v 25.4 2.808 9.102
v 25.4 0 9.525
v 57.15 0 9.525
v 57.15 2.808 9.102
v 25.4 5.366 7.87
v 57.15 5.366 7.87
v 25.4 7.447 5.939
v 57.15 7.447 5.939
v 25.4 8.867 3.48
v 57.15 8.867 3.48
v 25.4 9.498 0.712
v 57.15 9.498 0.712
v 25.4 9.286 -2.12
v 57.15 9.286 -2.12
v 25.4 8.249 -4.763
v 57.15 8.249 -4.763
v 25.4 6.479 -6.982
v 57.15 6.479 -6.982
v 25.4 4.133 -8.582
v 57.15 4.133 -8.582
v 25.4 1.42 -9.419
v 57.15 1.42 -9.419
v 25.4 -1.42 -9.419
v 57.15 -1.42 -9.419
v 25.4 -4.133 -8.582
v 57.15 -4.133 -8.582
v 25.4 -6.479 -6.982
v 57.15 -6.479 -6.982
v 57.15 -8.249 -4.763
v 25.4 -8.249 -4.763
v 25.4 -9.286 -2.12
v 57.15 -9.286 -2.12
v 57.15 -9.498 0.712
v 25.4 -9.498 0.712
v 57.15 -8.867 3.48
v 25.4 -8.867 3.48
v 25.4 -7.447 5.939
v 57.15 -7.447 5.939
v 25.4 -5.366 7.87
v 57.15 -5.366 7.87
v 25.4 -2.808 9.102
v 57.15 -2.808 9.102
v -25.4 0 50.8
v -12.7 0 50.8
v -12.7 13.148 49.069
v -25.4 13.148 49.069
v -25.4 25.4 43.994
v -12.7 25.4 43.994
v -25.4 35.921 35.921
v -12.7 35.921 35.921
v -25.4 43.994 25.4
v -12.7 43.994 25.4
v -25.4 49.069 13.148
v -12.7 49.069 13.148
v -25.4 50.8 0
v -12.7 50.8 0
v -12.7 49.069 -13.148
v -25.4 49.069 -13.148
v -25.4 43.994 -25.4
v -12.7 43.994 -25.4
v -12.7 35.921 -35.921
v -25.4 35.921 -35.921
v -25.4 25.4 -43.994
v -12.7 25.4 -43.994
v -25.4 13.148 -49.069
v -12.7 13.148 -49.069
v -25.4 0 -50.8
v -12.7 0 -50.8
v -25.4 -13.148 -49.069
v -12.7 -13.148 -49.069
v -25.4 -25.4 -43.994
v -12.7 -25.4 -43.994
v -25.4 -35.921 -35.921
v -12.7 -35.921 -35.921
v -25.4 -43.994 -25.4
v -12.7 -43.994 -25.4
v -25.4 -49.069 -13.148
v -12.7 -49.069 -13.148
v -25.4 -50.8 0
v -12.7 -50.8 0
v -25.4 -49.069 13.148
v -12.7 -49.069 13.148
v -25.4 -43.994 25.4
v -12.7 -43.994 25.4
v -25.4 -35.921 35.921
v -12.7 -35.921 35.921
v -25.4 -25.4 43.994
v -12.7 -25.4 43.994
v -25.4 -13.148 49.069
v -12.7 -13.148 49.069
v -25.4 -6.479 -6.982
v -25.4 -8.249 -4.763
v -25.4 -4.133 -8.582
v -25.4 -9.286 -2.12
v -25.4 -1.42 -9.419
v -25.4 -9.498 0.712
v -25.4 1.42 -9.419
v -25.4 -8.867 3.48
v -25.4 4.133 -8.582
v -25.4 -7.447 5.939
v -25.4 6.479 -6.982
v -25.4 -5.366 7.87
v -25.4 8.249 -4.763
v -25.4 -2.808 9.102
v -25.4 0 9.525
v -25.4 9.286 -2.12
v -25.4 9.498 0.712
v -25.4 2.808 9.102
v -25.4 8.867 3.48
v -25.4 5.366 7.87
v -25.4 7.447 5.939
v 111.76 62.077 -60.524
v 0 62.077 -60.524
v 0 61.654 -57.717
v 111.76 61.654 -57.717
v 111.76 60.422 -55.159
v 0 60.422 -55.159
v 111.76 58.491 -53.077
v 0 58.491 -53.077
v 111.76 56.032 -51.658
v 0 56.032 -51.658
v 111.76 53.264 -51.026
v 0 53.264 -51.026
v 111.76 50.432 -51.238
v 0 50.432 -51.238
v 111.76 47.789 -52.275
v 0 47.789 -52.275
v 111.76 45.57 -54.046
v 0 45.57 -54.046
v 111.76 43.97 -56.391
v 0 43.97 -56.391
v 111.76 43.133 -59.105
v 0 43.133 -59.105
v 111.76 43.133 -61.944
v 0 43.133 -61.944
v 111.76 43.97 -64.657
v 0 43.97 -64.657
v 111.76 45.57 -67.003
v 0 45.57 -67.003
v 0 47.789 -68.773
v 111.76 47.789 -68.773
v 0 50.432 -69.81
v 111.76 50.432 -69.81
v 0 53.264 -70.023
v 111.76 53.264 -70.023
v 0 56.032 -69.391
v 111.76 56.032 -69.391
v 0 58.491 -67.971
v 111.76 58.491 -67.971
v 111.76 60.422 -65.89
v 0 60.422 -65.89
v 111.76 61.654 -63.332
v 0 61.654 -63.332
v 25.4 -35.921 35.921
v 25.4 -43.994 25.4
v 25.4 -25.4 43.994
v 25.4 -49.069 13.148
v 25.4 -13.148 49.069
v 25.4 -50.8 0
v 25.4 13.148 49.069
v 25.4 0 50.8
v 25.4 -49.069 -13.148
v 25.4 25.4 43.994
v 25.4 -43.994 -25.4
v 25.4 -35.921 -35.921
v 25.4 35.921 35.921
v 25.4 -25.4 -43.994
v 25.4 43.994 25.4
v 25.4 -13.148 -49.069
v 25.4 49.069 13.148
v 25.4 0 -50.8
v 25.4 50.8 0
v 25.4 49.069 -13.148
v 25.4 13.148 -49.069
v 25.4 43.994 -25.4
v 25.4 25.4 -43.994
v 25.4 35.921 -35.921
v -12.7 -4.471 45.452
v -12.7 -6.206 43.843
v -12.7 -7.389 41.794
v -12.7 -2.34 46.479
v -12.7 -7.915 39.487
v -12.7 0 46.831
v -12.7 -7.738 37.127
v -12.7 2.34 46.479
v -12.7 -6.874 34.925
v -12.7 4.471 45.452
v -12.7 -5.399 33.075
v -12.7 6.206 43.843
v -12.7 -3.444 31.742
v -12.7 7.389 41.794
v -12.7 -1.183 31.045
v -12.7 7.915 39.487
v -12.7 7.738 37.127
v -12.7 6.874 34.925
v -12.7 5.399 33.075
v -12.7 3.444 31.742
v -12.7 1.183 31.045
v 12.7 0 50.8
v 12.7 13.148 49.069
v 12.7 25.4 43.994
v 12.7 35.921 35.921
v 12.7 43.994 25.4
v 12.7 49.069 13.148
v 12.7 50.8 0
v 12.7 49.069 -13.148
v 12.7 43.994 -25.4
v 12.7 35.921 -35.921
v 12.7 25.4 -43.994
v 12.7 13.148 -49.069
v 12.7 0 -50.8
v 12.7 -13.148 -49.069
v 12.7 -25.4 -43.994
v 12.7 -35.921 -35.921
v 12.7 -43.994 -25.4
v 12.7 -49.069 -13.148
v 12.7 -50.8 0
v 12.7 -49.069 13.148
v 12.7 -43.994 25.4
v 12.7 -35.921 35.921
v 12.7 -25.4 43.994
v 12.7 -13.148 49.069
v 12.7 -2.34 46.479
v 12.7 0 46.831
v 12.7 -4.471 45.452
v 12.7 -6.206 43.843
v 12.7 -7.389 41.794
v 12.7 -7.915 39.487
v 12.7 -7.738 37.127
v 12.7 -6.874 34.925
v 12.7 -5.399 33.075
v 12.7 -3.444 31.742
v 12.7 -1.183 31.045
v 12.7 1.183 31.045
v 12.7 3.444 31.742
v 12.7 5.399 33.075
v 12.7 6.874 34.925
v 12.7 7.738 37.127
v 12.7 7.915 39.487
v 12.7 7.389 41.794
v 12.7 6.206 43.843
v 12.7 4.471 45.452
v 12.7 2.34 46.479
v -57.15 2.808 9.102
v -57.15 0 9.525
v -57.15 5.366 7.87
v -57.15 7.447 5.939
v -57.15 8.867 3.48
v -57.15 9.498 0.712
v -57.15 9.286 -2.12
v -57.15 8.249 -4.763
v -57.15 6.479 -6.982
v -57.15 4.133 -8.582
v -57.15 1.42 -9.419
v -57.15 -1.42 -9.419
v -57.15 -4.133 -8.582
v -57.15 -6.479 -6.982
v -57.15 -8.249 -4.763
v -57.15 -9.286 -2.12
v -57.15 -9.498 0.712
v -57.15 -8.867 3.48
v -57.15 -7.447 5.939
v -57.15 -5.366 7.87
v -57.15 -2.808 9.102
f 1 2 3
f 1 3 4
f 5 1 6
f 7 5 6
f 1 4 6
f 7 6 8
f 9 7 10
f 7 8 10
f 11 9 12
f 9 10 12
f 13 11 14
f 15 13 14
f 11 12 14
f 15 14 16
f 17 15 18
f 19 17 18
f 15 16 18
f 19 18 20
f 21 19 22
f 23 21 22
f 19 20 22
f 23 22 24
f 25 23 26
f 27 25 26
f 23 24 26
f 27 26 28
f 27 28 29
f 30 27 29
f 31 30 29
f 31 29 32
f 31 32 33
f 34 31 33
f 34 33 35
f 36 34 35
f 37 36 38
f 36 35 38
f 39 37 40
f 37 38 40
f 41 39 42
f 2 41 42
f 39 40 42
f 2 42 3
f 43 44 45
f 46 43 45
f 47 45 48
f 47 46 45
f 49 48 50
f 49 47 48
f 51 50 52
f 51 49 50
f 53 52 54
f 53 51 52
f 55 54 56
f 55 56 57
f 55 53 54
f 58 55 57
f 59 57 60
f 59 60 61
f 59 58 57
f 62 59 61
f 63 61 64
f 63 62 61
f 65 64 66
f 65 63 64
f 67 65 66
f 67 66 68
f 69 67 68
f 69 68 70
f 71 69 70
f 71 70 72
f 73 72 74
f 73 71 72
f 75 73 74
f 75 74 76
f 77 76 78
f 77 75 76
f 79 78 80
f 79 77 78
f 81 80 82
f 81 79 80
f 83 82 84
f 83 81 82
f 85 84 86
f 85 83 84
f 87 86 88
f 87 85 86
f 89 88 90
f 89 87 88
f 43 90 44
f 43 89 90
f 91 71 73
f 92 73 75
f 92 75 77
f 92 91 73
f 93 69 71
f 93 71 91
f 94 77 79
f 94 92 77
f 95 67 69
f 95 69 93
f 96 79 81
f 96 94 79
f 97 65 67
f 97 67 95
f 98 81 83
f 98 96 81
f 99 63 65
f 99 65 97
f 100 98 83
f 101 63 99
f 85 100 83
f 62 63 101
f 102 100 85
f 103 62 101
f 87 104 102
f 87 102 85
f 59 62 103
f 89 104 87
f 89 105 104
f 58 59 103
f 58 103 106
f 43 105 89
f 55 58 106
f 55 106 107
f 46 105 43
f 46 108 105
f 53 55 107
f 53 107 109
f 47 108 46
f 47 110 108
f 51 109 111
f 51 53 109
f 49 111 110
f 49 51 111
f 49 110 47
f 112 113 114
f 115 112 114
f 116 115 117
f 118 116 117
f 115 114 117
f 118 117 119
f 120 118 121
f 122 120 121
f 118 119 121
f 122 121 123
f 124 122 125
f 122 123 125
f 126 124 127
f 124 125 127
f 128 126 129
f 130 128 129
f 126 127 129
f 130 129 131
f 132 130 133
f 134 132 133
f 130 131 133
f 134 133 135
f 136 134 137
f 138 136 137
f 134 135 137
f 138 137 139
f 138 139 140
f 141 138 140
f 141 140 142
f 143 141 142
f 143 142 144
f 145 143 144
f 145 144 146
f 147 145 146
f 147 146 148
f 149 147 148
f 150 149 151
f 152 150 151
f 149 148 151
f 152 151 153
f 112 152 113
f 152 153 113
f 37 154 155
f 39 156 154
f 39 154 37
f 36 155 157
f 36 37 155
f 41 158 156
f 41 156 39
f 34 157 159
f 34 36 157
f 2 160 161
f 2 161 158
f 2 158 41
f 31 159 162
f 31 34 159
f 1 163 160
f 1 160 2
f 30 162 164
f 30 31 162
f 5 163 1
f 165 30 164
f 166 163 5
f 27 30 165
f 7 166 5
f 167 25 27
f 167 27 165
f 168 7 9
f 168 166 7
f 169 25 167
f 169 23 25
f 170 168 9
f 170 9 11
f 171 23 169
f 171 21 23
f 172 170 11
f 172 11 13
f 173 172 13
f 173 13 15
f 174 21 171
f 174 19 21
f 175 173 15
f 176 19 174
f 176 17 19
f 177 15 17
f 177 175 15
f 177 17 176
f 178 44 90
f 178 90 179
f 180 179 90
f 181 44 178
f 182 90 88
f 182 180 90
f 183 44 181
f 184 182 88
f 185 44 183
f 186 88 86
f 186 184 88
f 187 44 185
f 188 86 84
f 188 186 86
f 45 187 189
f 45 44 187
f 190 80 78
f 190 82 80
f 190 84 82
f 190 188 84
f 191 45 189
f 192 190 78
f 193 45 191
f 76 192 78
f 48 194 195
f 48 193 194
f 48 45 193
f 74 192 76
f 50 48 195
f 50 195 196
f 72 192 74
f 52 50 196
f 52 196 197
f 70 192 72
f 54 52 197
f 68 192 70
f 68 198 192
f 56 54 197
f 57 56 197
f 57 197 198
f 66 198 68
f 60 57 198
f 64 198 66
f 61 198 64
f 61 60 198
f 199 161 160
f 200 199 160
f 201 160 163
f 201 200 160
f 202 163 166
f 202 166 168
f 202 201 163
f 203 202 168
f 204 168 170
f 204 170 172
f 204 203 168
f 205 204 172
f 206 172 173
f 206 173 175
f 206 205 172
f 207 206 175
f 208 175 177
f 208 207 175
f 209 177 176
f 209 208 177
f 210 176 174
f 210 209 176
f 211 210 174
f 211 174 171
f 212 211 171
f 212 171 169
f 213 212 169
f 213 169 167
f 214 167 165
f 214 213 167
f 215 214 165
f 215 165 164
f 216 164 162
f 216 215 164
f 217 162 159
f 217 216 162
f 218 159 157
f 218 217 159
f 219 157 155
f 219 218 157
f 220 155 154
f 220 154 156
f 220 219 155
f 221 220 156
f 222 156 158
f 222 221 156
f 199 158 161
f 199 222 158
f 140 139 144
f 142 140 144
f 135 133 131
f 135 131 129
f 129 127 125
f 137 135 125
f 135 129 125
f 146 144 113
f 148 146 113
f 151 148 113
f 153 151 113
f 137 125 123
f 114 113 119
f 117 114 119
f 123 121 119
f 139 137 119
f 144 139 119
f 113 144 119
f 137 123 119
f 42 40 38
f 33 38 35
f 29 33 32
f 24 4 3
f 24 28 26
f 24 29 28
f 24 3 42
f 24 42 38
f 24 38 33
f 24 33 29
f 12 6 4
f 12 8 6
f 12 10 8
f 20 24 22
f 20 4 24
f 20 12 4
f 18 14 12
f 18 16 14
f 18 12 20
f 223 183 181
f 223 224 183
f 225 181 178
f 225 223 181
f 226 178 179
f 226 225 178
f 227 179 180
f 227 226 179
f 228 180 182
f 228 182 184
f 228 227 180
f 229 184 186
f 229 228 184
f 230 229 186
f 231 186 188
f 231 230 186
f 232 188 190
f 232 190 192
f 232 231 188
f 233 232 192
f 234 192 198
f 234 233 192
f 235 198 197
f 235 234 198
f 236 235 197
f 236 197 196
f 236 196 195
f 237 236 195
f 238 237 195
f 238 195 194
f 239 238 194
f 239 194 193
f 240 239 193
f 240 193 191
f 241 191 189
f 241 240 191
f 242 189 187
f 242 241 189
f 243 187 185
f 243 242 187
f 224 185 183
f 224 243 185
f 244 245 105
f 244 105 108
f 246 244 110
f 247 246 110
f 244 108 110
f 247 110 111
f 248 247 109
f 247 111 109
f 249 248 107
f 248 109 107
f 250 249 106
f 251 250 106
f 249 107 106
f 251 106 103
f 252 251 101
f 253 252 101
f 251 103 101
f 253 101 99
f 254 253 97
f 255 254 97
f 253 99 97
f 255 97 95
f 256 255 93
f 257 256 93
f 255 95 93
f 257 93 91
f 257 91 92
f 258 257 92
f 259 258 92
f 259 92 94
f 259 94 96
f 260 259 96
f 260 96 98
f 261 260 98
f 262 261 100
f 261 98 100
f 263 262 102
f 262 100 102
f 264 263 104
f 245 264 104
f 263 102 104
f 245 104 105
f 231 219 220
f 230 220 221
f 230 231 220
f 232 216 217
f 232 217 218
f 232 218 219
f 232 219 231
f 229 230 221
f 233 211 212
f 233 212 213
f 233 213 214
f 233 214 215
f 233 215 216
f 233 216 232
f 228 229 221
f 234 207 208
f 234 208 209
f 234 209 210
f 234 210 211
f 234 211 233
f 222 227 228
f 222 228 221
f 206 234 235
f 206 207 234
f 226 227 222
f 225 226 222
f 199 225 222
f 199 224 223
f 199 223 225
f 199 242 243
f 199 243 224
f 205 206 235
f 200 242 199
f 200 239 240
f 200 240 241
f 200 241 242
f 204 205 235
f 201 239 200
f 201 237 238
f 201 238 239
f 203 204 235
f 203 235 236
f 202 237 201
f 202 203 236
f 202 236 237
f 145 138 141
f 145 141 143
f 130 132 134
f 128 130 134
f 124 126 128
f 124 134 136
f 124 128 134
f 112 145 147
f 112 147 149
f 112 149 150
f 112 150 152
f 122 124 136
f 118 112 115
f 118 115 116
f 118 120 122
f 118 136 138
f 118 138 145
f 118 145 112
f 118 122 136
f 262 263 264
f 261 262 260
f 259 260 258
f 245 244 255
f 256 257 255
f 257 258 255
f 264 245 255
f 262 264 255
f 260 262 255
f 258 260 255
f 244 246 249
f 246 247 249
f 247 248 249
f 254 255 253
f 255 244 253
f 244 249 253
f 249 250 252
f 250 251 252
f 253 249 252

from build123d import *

# Parameters (mm, degrees)
F0_W     = 31.75
F0_H     = 9.525
F2_W     = 25.4
F2_H     = 7.9375
F4_R     = 9.525
F5_DEPTH = 111.76


with BuildPart() as f1:
    # F0 (on Front) → F1 (revolve)
    with BuildSketch(Plane.XZ):
        with Locations((-41.275, 4.7625)):
            Rectangle(F0_W, F0_H)
        Polygon((-25.4, 9.525), (-25.4, 0), (-12.7, 0), (-12.7, 38.89375), (-12.7, 46.83125), (-12.7, 50.8), (-25.4, 50.8), align=None)
    revolve(axis=Axis((-41.275, 0, 0), (-1, 0, 0)))



with BuildPart() as f1b:
    # F0 (on Front) → F1, piece 2 (revolve)
    with BuildSketch(Plane.XZ):
        Polygon((12.7, 46.83125), (12.7, 38.89375), (12.7, 0), (25.4, 0), (25.4, 9.525), (25.4, 50.8), (12.7, 50.8), align=None)
        with Locations((41.275, 4.7625)):
            Rectangle(F0_W, F0_H)
    revolve(axis=Axis((-41.275, 0, 0), (-1, 0, 0)))


with BuildPart() as f1_1:
    add(f1.part)

    add(f1b.part)  # F3 merges F1b
    # F2 (on Front) → F3 (revolve)
    with BuildSketch(Plane.XZ):
        with Locations((0, 42.8625)):
            Rectangle(F2_W, F2_H)
    revolve(axis=Axis((0, 0, 38.89375), (1, 0, 0)))


with BuildPart() as f5:
    # F4 (on Right) → F5 (new body)
    with BuildSketch(Plane.YZ):
        with Locations((52.5518395007, -60.524225235)):
            Circle(F4_R)
    extrude(amount=F5_DEPTH)


solid = Compound([f1_1.part, f5.part])
